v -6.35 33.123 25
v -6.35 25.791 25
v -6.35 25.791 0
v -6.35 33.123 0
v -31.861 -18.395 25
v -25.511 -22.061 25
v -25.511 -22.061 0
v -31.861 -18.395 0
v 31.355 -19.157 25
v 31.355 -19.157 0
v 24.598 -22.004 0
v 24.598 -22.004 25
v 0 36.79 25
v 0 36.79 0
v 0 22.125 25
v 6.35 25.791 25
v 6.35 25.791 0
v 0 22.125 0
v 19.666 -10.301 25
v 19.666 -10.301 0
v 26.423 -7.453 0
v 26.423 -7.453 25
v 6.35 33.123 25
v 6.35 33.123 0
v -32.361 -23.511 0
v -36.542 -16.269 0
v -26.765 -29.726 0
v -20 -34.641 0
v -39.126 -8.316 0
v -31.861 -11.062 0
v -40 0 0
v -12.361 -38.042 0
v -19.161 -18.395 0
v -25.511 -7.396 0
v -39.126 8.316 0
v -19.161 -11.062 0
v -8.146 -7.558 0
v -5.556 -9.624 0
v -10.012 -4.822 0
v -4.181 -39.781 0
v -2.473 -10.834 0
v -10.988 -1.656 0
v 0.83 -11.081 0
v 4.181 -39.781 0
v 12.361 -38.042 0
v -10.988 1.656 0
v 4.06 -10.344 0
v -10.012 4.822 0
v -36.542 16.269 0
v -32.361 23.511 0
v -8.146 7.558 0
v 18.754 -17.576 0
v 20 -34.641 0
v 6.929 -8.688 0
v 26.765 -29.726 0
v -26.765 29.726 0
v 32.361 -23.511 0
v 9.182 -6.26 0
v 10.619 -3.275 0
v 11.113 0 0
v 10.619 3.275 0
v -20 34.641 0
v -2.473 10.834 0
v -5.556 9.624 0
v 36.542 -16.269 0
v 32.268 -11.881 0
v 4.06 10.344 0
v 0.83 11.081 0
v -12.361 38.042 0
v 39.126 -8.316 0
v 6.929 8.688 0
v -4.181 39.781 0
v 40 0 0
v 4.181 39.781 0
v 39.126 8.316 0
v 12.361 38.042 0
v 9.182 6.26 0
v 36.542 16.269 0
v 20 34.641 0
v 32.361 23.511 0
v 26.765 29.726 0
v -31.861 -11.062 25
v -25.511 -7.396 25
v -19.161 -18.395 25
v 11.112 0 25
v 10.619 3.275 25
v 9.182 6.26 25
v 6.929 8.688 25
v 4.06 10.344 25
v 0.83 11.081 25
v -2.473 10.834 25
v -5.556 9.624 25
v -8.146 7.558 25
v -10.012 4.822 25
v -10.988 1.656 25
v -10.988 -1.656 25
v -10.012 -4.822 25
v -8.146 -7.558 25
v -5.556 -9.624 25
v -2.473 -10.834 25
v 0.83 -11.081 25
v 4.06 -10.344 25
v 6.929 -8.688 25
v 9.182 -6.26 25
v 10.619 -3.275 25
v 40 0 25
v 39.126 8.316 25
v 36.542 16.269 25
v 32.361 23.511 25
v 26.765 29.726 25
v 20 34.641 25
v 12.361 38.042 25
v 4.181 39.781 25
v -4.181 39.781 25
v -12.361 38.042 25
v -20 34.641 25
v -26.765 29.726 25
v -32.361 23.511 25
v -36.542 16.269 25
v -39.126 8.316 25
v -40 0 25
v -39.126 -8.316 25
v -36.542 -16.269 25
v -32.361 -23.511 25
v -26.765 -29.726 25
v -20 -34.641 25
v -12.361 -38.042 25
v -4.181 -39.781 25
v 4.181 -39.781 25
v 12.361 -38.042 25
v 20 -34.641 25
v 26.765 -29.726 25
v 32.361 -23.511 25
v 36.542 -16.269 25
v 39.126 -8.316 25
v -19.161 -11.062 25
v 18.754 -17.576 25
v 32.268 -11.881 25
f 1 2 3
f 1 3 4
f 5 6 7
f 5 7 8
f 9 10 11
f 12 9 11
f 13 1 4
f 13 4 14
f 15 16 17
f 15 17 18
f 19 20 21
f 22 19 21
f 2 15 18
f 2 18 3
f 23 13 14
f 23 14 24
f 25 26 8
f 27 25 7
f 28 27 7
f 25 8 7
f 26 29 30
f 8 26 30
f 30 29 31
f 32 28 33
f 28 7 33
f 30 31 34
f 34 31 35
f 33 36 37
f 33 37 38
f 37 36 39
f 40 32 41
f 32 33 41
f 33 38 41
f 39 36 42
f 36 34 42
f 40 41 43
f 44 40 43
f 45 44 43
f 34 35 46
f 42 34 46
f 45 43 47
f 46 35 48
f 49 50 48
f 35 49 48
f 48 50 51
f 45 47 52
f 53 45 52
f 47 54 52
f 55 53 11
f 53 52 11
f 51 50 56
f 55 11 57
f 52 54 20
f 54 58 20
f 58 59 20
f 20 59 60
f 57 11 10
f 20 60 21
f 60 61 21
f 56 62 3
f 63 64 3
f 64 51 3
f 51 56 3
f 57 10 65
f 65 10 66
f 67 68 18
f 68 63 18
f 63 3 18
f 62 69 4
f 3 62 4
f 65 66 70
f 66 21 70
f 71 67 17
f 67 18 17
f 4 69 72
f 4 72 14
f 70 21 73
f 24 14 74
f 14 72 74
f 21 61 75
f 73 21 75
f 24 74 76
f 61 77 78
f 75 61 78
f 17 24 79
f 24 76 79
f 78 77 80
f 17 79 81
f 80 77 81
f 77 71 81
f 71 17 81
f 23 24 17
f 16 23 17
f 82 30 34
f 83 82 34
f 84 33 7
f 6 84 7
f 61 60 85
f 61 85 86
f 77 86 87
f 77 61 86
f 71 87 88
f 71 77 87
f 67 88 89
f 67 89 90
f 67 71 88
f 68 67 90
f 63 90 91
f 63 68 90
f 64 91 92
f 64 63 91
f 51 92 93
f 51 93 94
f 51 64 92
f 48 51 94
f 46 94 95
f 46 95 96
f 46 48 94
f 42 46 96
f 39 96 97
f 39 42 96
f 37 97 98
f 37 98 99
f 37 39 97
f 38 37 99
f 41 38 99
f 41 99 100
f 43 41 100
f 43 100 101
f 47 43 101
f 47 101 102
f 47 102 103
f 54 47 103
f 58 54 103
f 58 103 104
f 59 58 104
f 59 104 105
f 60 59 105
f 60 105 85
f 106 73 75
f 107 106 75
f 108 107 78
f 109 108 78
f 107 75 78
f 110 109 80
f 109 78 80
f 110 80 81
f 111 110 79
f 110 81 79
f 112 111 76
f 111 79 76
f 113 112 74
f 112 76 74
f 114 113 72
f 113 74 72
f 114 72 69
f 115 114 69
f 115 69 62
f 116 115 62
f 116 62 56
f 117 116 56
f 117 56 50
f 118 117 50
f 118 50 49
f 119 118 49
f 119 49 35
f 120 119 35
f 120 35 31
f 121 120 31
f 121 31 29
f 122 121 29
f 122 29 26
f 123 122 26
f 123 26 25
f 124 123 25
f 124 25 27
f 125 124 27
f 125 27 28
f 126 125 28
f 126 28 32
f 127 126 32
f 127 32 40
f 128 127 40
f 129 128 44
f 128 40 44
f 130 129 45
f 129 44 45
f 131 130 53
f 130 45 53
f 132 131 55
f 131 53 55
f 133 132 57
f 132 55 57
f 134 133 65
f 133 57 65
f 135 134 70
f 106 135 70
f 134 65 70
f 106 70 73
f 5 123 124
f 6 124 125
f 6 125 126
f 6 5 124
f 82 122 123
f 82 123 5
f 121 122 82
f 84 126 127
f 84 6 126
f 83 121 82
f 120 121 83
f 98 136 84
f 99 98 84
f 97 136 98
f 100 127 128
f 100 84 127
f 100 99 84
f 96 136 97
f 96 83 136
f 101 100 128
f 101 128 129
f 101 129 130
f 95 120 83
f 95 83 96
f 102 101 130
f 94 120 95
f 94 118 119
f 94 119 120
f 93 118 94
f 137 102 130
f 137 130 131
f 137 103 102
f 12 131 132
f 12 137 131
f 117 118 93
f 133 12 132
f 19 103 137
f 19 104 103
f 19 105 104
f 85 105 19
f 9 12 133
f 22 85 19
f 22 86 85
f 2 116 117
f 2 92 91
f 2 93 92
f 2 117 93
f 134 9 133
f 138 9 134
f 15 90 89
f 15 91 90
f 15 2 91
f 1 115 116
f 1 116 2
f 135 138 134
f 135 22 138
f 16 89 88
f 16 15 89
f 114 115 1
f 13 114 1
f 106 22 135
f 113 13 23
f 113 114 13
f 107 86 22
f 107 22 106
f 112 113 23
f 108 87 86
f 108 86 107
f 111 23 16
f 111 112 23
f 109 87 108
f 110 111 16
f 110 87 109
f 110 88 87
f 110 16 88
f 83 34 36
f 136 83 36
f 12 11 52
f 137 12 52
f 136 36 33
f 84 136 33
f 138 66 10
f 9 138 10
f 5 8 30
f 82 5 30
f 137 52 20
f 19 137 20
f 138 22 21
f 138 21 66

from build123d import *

# Parameters (mm, degrees)
F0_R     = 40
F0_R_2   = 11.1125
F1_DEPTH = 7.5
F2_DEPTH = 25


with BuildPart() as f1:
    # F0 (on Top) → F1 (new body)
    with BuildSketch(Plane.XY):
        Circle(F0_R)
        Polygon((-25.510716, -7.39627), (-19.160716, -11.062445), (-19.160716, -18.394793), (-25.510716, -22.060967), (-31.860716, -18.394793), (-31.860716, -11.062445), align=None, mode=Mode.SUBTRACT)
        Polygon((26.423282, -7.45328), (32.267627, -11.881254), (31.355062, -19.156593), (24.59815, -22.003958), (18.753805, -17.575983), (19.666371, -10.300644), align=None, mode=Mode.SUBTRACT)
        Circle(F0_R_2, mode=Mode.SUBTRACT)
        Polygon((0, 36.789586), (6.35, 33.123412), (6.35, 25.791063), (0, 22.124889), (-6.35, 25.791063), (-6.35, 33.123412), align=None, mode=Mode.SUBTRACT)
    extrude(amount=F1_DEPTH)

    # F0 (on Top) → F2 (join)
    with BuildSketch(Plane.XY):
        Circle(F0_R)
        Polygon((-25.510716, -7.39627), (-19.160716, -11.062445), (-19.160716, -18.394793), (-25.510716, -22.060967), (-31.860716, -18.394793), (-31.860716, -11.062445), align=None, mode=Mode.SUBTRACT)
        Polygon((26.423282, -7.45328), (32.267627, -11.881254), (31.355062, -19.156593), (24.59815, -22.003958), (18.753805, -17.575983), (19.666371, -10.300644), align=None, mode=Mode.SUBTRACT)
        Circle(F0_R_2, mode=Mode.SUBTRACT)
        Polygon((0, 36.789586), (6.35, 33.123412), (6.35, 25.791063), (0, 22.124889), (-6.35, 25.791063), (-6.35, 33.123412), align=None, mode=Mode.SUBTRACT)
    extrude(amount=F2_DEPTH)


solid = f1.part
